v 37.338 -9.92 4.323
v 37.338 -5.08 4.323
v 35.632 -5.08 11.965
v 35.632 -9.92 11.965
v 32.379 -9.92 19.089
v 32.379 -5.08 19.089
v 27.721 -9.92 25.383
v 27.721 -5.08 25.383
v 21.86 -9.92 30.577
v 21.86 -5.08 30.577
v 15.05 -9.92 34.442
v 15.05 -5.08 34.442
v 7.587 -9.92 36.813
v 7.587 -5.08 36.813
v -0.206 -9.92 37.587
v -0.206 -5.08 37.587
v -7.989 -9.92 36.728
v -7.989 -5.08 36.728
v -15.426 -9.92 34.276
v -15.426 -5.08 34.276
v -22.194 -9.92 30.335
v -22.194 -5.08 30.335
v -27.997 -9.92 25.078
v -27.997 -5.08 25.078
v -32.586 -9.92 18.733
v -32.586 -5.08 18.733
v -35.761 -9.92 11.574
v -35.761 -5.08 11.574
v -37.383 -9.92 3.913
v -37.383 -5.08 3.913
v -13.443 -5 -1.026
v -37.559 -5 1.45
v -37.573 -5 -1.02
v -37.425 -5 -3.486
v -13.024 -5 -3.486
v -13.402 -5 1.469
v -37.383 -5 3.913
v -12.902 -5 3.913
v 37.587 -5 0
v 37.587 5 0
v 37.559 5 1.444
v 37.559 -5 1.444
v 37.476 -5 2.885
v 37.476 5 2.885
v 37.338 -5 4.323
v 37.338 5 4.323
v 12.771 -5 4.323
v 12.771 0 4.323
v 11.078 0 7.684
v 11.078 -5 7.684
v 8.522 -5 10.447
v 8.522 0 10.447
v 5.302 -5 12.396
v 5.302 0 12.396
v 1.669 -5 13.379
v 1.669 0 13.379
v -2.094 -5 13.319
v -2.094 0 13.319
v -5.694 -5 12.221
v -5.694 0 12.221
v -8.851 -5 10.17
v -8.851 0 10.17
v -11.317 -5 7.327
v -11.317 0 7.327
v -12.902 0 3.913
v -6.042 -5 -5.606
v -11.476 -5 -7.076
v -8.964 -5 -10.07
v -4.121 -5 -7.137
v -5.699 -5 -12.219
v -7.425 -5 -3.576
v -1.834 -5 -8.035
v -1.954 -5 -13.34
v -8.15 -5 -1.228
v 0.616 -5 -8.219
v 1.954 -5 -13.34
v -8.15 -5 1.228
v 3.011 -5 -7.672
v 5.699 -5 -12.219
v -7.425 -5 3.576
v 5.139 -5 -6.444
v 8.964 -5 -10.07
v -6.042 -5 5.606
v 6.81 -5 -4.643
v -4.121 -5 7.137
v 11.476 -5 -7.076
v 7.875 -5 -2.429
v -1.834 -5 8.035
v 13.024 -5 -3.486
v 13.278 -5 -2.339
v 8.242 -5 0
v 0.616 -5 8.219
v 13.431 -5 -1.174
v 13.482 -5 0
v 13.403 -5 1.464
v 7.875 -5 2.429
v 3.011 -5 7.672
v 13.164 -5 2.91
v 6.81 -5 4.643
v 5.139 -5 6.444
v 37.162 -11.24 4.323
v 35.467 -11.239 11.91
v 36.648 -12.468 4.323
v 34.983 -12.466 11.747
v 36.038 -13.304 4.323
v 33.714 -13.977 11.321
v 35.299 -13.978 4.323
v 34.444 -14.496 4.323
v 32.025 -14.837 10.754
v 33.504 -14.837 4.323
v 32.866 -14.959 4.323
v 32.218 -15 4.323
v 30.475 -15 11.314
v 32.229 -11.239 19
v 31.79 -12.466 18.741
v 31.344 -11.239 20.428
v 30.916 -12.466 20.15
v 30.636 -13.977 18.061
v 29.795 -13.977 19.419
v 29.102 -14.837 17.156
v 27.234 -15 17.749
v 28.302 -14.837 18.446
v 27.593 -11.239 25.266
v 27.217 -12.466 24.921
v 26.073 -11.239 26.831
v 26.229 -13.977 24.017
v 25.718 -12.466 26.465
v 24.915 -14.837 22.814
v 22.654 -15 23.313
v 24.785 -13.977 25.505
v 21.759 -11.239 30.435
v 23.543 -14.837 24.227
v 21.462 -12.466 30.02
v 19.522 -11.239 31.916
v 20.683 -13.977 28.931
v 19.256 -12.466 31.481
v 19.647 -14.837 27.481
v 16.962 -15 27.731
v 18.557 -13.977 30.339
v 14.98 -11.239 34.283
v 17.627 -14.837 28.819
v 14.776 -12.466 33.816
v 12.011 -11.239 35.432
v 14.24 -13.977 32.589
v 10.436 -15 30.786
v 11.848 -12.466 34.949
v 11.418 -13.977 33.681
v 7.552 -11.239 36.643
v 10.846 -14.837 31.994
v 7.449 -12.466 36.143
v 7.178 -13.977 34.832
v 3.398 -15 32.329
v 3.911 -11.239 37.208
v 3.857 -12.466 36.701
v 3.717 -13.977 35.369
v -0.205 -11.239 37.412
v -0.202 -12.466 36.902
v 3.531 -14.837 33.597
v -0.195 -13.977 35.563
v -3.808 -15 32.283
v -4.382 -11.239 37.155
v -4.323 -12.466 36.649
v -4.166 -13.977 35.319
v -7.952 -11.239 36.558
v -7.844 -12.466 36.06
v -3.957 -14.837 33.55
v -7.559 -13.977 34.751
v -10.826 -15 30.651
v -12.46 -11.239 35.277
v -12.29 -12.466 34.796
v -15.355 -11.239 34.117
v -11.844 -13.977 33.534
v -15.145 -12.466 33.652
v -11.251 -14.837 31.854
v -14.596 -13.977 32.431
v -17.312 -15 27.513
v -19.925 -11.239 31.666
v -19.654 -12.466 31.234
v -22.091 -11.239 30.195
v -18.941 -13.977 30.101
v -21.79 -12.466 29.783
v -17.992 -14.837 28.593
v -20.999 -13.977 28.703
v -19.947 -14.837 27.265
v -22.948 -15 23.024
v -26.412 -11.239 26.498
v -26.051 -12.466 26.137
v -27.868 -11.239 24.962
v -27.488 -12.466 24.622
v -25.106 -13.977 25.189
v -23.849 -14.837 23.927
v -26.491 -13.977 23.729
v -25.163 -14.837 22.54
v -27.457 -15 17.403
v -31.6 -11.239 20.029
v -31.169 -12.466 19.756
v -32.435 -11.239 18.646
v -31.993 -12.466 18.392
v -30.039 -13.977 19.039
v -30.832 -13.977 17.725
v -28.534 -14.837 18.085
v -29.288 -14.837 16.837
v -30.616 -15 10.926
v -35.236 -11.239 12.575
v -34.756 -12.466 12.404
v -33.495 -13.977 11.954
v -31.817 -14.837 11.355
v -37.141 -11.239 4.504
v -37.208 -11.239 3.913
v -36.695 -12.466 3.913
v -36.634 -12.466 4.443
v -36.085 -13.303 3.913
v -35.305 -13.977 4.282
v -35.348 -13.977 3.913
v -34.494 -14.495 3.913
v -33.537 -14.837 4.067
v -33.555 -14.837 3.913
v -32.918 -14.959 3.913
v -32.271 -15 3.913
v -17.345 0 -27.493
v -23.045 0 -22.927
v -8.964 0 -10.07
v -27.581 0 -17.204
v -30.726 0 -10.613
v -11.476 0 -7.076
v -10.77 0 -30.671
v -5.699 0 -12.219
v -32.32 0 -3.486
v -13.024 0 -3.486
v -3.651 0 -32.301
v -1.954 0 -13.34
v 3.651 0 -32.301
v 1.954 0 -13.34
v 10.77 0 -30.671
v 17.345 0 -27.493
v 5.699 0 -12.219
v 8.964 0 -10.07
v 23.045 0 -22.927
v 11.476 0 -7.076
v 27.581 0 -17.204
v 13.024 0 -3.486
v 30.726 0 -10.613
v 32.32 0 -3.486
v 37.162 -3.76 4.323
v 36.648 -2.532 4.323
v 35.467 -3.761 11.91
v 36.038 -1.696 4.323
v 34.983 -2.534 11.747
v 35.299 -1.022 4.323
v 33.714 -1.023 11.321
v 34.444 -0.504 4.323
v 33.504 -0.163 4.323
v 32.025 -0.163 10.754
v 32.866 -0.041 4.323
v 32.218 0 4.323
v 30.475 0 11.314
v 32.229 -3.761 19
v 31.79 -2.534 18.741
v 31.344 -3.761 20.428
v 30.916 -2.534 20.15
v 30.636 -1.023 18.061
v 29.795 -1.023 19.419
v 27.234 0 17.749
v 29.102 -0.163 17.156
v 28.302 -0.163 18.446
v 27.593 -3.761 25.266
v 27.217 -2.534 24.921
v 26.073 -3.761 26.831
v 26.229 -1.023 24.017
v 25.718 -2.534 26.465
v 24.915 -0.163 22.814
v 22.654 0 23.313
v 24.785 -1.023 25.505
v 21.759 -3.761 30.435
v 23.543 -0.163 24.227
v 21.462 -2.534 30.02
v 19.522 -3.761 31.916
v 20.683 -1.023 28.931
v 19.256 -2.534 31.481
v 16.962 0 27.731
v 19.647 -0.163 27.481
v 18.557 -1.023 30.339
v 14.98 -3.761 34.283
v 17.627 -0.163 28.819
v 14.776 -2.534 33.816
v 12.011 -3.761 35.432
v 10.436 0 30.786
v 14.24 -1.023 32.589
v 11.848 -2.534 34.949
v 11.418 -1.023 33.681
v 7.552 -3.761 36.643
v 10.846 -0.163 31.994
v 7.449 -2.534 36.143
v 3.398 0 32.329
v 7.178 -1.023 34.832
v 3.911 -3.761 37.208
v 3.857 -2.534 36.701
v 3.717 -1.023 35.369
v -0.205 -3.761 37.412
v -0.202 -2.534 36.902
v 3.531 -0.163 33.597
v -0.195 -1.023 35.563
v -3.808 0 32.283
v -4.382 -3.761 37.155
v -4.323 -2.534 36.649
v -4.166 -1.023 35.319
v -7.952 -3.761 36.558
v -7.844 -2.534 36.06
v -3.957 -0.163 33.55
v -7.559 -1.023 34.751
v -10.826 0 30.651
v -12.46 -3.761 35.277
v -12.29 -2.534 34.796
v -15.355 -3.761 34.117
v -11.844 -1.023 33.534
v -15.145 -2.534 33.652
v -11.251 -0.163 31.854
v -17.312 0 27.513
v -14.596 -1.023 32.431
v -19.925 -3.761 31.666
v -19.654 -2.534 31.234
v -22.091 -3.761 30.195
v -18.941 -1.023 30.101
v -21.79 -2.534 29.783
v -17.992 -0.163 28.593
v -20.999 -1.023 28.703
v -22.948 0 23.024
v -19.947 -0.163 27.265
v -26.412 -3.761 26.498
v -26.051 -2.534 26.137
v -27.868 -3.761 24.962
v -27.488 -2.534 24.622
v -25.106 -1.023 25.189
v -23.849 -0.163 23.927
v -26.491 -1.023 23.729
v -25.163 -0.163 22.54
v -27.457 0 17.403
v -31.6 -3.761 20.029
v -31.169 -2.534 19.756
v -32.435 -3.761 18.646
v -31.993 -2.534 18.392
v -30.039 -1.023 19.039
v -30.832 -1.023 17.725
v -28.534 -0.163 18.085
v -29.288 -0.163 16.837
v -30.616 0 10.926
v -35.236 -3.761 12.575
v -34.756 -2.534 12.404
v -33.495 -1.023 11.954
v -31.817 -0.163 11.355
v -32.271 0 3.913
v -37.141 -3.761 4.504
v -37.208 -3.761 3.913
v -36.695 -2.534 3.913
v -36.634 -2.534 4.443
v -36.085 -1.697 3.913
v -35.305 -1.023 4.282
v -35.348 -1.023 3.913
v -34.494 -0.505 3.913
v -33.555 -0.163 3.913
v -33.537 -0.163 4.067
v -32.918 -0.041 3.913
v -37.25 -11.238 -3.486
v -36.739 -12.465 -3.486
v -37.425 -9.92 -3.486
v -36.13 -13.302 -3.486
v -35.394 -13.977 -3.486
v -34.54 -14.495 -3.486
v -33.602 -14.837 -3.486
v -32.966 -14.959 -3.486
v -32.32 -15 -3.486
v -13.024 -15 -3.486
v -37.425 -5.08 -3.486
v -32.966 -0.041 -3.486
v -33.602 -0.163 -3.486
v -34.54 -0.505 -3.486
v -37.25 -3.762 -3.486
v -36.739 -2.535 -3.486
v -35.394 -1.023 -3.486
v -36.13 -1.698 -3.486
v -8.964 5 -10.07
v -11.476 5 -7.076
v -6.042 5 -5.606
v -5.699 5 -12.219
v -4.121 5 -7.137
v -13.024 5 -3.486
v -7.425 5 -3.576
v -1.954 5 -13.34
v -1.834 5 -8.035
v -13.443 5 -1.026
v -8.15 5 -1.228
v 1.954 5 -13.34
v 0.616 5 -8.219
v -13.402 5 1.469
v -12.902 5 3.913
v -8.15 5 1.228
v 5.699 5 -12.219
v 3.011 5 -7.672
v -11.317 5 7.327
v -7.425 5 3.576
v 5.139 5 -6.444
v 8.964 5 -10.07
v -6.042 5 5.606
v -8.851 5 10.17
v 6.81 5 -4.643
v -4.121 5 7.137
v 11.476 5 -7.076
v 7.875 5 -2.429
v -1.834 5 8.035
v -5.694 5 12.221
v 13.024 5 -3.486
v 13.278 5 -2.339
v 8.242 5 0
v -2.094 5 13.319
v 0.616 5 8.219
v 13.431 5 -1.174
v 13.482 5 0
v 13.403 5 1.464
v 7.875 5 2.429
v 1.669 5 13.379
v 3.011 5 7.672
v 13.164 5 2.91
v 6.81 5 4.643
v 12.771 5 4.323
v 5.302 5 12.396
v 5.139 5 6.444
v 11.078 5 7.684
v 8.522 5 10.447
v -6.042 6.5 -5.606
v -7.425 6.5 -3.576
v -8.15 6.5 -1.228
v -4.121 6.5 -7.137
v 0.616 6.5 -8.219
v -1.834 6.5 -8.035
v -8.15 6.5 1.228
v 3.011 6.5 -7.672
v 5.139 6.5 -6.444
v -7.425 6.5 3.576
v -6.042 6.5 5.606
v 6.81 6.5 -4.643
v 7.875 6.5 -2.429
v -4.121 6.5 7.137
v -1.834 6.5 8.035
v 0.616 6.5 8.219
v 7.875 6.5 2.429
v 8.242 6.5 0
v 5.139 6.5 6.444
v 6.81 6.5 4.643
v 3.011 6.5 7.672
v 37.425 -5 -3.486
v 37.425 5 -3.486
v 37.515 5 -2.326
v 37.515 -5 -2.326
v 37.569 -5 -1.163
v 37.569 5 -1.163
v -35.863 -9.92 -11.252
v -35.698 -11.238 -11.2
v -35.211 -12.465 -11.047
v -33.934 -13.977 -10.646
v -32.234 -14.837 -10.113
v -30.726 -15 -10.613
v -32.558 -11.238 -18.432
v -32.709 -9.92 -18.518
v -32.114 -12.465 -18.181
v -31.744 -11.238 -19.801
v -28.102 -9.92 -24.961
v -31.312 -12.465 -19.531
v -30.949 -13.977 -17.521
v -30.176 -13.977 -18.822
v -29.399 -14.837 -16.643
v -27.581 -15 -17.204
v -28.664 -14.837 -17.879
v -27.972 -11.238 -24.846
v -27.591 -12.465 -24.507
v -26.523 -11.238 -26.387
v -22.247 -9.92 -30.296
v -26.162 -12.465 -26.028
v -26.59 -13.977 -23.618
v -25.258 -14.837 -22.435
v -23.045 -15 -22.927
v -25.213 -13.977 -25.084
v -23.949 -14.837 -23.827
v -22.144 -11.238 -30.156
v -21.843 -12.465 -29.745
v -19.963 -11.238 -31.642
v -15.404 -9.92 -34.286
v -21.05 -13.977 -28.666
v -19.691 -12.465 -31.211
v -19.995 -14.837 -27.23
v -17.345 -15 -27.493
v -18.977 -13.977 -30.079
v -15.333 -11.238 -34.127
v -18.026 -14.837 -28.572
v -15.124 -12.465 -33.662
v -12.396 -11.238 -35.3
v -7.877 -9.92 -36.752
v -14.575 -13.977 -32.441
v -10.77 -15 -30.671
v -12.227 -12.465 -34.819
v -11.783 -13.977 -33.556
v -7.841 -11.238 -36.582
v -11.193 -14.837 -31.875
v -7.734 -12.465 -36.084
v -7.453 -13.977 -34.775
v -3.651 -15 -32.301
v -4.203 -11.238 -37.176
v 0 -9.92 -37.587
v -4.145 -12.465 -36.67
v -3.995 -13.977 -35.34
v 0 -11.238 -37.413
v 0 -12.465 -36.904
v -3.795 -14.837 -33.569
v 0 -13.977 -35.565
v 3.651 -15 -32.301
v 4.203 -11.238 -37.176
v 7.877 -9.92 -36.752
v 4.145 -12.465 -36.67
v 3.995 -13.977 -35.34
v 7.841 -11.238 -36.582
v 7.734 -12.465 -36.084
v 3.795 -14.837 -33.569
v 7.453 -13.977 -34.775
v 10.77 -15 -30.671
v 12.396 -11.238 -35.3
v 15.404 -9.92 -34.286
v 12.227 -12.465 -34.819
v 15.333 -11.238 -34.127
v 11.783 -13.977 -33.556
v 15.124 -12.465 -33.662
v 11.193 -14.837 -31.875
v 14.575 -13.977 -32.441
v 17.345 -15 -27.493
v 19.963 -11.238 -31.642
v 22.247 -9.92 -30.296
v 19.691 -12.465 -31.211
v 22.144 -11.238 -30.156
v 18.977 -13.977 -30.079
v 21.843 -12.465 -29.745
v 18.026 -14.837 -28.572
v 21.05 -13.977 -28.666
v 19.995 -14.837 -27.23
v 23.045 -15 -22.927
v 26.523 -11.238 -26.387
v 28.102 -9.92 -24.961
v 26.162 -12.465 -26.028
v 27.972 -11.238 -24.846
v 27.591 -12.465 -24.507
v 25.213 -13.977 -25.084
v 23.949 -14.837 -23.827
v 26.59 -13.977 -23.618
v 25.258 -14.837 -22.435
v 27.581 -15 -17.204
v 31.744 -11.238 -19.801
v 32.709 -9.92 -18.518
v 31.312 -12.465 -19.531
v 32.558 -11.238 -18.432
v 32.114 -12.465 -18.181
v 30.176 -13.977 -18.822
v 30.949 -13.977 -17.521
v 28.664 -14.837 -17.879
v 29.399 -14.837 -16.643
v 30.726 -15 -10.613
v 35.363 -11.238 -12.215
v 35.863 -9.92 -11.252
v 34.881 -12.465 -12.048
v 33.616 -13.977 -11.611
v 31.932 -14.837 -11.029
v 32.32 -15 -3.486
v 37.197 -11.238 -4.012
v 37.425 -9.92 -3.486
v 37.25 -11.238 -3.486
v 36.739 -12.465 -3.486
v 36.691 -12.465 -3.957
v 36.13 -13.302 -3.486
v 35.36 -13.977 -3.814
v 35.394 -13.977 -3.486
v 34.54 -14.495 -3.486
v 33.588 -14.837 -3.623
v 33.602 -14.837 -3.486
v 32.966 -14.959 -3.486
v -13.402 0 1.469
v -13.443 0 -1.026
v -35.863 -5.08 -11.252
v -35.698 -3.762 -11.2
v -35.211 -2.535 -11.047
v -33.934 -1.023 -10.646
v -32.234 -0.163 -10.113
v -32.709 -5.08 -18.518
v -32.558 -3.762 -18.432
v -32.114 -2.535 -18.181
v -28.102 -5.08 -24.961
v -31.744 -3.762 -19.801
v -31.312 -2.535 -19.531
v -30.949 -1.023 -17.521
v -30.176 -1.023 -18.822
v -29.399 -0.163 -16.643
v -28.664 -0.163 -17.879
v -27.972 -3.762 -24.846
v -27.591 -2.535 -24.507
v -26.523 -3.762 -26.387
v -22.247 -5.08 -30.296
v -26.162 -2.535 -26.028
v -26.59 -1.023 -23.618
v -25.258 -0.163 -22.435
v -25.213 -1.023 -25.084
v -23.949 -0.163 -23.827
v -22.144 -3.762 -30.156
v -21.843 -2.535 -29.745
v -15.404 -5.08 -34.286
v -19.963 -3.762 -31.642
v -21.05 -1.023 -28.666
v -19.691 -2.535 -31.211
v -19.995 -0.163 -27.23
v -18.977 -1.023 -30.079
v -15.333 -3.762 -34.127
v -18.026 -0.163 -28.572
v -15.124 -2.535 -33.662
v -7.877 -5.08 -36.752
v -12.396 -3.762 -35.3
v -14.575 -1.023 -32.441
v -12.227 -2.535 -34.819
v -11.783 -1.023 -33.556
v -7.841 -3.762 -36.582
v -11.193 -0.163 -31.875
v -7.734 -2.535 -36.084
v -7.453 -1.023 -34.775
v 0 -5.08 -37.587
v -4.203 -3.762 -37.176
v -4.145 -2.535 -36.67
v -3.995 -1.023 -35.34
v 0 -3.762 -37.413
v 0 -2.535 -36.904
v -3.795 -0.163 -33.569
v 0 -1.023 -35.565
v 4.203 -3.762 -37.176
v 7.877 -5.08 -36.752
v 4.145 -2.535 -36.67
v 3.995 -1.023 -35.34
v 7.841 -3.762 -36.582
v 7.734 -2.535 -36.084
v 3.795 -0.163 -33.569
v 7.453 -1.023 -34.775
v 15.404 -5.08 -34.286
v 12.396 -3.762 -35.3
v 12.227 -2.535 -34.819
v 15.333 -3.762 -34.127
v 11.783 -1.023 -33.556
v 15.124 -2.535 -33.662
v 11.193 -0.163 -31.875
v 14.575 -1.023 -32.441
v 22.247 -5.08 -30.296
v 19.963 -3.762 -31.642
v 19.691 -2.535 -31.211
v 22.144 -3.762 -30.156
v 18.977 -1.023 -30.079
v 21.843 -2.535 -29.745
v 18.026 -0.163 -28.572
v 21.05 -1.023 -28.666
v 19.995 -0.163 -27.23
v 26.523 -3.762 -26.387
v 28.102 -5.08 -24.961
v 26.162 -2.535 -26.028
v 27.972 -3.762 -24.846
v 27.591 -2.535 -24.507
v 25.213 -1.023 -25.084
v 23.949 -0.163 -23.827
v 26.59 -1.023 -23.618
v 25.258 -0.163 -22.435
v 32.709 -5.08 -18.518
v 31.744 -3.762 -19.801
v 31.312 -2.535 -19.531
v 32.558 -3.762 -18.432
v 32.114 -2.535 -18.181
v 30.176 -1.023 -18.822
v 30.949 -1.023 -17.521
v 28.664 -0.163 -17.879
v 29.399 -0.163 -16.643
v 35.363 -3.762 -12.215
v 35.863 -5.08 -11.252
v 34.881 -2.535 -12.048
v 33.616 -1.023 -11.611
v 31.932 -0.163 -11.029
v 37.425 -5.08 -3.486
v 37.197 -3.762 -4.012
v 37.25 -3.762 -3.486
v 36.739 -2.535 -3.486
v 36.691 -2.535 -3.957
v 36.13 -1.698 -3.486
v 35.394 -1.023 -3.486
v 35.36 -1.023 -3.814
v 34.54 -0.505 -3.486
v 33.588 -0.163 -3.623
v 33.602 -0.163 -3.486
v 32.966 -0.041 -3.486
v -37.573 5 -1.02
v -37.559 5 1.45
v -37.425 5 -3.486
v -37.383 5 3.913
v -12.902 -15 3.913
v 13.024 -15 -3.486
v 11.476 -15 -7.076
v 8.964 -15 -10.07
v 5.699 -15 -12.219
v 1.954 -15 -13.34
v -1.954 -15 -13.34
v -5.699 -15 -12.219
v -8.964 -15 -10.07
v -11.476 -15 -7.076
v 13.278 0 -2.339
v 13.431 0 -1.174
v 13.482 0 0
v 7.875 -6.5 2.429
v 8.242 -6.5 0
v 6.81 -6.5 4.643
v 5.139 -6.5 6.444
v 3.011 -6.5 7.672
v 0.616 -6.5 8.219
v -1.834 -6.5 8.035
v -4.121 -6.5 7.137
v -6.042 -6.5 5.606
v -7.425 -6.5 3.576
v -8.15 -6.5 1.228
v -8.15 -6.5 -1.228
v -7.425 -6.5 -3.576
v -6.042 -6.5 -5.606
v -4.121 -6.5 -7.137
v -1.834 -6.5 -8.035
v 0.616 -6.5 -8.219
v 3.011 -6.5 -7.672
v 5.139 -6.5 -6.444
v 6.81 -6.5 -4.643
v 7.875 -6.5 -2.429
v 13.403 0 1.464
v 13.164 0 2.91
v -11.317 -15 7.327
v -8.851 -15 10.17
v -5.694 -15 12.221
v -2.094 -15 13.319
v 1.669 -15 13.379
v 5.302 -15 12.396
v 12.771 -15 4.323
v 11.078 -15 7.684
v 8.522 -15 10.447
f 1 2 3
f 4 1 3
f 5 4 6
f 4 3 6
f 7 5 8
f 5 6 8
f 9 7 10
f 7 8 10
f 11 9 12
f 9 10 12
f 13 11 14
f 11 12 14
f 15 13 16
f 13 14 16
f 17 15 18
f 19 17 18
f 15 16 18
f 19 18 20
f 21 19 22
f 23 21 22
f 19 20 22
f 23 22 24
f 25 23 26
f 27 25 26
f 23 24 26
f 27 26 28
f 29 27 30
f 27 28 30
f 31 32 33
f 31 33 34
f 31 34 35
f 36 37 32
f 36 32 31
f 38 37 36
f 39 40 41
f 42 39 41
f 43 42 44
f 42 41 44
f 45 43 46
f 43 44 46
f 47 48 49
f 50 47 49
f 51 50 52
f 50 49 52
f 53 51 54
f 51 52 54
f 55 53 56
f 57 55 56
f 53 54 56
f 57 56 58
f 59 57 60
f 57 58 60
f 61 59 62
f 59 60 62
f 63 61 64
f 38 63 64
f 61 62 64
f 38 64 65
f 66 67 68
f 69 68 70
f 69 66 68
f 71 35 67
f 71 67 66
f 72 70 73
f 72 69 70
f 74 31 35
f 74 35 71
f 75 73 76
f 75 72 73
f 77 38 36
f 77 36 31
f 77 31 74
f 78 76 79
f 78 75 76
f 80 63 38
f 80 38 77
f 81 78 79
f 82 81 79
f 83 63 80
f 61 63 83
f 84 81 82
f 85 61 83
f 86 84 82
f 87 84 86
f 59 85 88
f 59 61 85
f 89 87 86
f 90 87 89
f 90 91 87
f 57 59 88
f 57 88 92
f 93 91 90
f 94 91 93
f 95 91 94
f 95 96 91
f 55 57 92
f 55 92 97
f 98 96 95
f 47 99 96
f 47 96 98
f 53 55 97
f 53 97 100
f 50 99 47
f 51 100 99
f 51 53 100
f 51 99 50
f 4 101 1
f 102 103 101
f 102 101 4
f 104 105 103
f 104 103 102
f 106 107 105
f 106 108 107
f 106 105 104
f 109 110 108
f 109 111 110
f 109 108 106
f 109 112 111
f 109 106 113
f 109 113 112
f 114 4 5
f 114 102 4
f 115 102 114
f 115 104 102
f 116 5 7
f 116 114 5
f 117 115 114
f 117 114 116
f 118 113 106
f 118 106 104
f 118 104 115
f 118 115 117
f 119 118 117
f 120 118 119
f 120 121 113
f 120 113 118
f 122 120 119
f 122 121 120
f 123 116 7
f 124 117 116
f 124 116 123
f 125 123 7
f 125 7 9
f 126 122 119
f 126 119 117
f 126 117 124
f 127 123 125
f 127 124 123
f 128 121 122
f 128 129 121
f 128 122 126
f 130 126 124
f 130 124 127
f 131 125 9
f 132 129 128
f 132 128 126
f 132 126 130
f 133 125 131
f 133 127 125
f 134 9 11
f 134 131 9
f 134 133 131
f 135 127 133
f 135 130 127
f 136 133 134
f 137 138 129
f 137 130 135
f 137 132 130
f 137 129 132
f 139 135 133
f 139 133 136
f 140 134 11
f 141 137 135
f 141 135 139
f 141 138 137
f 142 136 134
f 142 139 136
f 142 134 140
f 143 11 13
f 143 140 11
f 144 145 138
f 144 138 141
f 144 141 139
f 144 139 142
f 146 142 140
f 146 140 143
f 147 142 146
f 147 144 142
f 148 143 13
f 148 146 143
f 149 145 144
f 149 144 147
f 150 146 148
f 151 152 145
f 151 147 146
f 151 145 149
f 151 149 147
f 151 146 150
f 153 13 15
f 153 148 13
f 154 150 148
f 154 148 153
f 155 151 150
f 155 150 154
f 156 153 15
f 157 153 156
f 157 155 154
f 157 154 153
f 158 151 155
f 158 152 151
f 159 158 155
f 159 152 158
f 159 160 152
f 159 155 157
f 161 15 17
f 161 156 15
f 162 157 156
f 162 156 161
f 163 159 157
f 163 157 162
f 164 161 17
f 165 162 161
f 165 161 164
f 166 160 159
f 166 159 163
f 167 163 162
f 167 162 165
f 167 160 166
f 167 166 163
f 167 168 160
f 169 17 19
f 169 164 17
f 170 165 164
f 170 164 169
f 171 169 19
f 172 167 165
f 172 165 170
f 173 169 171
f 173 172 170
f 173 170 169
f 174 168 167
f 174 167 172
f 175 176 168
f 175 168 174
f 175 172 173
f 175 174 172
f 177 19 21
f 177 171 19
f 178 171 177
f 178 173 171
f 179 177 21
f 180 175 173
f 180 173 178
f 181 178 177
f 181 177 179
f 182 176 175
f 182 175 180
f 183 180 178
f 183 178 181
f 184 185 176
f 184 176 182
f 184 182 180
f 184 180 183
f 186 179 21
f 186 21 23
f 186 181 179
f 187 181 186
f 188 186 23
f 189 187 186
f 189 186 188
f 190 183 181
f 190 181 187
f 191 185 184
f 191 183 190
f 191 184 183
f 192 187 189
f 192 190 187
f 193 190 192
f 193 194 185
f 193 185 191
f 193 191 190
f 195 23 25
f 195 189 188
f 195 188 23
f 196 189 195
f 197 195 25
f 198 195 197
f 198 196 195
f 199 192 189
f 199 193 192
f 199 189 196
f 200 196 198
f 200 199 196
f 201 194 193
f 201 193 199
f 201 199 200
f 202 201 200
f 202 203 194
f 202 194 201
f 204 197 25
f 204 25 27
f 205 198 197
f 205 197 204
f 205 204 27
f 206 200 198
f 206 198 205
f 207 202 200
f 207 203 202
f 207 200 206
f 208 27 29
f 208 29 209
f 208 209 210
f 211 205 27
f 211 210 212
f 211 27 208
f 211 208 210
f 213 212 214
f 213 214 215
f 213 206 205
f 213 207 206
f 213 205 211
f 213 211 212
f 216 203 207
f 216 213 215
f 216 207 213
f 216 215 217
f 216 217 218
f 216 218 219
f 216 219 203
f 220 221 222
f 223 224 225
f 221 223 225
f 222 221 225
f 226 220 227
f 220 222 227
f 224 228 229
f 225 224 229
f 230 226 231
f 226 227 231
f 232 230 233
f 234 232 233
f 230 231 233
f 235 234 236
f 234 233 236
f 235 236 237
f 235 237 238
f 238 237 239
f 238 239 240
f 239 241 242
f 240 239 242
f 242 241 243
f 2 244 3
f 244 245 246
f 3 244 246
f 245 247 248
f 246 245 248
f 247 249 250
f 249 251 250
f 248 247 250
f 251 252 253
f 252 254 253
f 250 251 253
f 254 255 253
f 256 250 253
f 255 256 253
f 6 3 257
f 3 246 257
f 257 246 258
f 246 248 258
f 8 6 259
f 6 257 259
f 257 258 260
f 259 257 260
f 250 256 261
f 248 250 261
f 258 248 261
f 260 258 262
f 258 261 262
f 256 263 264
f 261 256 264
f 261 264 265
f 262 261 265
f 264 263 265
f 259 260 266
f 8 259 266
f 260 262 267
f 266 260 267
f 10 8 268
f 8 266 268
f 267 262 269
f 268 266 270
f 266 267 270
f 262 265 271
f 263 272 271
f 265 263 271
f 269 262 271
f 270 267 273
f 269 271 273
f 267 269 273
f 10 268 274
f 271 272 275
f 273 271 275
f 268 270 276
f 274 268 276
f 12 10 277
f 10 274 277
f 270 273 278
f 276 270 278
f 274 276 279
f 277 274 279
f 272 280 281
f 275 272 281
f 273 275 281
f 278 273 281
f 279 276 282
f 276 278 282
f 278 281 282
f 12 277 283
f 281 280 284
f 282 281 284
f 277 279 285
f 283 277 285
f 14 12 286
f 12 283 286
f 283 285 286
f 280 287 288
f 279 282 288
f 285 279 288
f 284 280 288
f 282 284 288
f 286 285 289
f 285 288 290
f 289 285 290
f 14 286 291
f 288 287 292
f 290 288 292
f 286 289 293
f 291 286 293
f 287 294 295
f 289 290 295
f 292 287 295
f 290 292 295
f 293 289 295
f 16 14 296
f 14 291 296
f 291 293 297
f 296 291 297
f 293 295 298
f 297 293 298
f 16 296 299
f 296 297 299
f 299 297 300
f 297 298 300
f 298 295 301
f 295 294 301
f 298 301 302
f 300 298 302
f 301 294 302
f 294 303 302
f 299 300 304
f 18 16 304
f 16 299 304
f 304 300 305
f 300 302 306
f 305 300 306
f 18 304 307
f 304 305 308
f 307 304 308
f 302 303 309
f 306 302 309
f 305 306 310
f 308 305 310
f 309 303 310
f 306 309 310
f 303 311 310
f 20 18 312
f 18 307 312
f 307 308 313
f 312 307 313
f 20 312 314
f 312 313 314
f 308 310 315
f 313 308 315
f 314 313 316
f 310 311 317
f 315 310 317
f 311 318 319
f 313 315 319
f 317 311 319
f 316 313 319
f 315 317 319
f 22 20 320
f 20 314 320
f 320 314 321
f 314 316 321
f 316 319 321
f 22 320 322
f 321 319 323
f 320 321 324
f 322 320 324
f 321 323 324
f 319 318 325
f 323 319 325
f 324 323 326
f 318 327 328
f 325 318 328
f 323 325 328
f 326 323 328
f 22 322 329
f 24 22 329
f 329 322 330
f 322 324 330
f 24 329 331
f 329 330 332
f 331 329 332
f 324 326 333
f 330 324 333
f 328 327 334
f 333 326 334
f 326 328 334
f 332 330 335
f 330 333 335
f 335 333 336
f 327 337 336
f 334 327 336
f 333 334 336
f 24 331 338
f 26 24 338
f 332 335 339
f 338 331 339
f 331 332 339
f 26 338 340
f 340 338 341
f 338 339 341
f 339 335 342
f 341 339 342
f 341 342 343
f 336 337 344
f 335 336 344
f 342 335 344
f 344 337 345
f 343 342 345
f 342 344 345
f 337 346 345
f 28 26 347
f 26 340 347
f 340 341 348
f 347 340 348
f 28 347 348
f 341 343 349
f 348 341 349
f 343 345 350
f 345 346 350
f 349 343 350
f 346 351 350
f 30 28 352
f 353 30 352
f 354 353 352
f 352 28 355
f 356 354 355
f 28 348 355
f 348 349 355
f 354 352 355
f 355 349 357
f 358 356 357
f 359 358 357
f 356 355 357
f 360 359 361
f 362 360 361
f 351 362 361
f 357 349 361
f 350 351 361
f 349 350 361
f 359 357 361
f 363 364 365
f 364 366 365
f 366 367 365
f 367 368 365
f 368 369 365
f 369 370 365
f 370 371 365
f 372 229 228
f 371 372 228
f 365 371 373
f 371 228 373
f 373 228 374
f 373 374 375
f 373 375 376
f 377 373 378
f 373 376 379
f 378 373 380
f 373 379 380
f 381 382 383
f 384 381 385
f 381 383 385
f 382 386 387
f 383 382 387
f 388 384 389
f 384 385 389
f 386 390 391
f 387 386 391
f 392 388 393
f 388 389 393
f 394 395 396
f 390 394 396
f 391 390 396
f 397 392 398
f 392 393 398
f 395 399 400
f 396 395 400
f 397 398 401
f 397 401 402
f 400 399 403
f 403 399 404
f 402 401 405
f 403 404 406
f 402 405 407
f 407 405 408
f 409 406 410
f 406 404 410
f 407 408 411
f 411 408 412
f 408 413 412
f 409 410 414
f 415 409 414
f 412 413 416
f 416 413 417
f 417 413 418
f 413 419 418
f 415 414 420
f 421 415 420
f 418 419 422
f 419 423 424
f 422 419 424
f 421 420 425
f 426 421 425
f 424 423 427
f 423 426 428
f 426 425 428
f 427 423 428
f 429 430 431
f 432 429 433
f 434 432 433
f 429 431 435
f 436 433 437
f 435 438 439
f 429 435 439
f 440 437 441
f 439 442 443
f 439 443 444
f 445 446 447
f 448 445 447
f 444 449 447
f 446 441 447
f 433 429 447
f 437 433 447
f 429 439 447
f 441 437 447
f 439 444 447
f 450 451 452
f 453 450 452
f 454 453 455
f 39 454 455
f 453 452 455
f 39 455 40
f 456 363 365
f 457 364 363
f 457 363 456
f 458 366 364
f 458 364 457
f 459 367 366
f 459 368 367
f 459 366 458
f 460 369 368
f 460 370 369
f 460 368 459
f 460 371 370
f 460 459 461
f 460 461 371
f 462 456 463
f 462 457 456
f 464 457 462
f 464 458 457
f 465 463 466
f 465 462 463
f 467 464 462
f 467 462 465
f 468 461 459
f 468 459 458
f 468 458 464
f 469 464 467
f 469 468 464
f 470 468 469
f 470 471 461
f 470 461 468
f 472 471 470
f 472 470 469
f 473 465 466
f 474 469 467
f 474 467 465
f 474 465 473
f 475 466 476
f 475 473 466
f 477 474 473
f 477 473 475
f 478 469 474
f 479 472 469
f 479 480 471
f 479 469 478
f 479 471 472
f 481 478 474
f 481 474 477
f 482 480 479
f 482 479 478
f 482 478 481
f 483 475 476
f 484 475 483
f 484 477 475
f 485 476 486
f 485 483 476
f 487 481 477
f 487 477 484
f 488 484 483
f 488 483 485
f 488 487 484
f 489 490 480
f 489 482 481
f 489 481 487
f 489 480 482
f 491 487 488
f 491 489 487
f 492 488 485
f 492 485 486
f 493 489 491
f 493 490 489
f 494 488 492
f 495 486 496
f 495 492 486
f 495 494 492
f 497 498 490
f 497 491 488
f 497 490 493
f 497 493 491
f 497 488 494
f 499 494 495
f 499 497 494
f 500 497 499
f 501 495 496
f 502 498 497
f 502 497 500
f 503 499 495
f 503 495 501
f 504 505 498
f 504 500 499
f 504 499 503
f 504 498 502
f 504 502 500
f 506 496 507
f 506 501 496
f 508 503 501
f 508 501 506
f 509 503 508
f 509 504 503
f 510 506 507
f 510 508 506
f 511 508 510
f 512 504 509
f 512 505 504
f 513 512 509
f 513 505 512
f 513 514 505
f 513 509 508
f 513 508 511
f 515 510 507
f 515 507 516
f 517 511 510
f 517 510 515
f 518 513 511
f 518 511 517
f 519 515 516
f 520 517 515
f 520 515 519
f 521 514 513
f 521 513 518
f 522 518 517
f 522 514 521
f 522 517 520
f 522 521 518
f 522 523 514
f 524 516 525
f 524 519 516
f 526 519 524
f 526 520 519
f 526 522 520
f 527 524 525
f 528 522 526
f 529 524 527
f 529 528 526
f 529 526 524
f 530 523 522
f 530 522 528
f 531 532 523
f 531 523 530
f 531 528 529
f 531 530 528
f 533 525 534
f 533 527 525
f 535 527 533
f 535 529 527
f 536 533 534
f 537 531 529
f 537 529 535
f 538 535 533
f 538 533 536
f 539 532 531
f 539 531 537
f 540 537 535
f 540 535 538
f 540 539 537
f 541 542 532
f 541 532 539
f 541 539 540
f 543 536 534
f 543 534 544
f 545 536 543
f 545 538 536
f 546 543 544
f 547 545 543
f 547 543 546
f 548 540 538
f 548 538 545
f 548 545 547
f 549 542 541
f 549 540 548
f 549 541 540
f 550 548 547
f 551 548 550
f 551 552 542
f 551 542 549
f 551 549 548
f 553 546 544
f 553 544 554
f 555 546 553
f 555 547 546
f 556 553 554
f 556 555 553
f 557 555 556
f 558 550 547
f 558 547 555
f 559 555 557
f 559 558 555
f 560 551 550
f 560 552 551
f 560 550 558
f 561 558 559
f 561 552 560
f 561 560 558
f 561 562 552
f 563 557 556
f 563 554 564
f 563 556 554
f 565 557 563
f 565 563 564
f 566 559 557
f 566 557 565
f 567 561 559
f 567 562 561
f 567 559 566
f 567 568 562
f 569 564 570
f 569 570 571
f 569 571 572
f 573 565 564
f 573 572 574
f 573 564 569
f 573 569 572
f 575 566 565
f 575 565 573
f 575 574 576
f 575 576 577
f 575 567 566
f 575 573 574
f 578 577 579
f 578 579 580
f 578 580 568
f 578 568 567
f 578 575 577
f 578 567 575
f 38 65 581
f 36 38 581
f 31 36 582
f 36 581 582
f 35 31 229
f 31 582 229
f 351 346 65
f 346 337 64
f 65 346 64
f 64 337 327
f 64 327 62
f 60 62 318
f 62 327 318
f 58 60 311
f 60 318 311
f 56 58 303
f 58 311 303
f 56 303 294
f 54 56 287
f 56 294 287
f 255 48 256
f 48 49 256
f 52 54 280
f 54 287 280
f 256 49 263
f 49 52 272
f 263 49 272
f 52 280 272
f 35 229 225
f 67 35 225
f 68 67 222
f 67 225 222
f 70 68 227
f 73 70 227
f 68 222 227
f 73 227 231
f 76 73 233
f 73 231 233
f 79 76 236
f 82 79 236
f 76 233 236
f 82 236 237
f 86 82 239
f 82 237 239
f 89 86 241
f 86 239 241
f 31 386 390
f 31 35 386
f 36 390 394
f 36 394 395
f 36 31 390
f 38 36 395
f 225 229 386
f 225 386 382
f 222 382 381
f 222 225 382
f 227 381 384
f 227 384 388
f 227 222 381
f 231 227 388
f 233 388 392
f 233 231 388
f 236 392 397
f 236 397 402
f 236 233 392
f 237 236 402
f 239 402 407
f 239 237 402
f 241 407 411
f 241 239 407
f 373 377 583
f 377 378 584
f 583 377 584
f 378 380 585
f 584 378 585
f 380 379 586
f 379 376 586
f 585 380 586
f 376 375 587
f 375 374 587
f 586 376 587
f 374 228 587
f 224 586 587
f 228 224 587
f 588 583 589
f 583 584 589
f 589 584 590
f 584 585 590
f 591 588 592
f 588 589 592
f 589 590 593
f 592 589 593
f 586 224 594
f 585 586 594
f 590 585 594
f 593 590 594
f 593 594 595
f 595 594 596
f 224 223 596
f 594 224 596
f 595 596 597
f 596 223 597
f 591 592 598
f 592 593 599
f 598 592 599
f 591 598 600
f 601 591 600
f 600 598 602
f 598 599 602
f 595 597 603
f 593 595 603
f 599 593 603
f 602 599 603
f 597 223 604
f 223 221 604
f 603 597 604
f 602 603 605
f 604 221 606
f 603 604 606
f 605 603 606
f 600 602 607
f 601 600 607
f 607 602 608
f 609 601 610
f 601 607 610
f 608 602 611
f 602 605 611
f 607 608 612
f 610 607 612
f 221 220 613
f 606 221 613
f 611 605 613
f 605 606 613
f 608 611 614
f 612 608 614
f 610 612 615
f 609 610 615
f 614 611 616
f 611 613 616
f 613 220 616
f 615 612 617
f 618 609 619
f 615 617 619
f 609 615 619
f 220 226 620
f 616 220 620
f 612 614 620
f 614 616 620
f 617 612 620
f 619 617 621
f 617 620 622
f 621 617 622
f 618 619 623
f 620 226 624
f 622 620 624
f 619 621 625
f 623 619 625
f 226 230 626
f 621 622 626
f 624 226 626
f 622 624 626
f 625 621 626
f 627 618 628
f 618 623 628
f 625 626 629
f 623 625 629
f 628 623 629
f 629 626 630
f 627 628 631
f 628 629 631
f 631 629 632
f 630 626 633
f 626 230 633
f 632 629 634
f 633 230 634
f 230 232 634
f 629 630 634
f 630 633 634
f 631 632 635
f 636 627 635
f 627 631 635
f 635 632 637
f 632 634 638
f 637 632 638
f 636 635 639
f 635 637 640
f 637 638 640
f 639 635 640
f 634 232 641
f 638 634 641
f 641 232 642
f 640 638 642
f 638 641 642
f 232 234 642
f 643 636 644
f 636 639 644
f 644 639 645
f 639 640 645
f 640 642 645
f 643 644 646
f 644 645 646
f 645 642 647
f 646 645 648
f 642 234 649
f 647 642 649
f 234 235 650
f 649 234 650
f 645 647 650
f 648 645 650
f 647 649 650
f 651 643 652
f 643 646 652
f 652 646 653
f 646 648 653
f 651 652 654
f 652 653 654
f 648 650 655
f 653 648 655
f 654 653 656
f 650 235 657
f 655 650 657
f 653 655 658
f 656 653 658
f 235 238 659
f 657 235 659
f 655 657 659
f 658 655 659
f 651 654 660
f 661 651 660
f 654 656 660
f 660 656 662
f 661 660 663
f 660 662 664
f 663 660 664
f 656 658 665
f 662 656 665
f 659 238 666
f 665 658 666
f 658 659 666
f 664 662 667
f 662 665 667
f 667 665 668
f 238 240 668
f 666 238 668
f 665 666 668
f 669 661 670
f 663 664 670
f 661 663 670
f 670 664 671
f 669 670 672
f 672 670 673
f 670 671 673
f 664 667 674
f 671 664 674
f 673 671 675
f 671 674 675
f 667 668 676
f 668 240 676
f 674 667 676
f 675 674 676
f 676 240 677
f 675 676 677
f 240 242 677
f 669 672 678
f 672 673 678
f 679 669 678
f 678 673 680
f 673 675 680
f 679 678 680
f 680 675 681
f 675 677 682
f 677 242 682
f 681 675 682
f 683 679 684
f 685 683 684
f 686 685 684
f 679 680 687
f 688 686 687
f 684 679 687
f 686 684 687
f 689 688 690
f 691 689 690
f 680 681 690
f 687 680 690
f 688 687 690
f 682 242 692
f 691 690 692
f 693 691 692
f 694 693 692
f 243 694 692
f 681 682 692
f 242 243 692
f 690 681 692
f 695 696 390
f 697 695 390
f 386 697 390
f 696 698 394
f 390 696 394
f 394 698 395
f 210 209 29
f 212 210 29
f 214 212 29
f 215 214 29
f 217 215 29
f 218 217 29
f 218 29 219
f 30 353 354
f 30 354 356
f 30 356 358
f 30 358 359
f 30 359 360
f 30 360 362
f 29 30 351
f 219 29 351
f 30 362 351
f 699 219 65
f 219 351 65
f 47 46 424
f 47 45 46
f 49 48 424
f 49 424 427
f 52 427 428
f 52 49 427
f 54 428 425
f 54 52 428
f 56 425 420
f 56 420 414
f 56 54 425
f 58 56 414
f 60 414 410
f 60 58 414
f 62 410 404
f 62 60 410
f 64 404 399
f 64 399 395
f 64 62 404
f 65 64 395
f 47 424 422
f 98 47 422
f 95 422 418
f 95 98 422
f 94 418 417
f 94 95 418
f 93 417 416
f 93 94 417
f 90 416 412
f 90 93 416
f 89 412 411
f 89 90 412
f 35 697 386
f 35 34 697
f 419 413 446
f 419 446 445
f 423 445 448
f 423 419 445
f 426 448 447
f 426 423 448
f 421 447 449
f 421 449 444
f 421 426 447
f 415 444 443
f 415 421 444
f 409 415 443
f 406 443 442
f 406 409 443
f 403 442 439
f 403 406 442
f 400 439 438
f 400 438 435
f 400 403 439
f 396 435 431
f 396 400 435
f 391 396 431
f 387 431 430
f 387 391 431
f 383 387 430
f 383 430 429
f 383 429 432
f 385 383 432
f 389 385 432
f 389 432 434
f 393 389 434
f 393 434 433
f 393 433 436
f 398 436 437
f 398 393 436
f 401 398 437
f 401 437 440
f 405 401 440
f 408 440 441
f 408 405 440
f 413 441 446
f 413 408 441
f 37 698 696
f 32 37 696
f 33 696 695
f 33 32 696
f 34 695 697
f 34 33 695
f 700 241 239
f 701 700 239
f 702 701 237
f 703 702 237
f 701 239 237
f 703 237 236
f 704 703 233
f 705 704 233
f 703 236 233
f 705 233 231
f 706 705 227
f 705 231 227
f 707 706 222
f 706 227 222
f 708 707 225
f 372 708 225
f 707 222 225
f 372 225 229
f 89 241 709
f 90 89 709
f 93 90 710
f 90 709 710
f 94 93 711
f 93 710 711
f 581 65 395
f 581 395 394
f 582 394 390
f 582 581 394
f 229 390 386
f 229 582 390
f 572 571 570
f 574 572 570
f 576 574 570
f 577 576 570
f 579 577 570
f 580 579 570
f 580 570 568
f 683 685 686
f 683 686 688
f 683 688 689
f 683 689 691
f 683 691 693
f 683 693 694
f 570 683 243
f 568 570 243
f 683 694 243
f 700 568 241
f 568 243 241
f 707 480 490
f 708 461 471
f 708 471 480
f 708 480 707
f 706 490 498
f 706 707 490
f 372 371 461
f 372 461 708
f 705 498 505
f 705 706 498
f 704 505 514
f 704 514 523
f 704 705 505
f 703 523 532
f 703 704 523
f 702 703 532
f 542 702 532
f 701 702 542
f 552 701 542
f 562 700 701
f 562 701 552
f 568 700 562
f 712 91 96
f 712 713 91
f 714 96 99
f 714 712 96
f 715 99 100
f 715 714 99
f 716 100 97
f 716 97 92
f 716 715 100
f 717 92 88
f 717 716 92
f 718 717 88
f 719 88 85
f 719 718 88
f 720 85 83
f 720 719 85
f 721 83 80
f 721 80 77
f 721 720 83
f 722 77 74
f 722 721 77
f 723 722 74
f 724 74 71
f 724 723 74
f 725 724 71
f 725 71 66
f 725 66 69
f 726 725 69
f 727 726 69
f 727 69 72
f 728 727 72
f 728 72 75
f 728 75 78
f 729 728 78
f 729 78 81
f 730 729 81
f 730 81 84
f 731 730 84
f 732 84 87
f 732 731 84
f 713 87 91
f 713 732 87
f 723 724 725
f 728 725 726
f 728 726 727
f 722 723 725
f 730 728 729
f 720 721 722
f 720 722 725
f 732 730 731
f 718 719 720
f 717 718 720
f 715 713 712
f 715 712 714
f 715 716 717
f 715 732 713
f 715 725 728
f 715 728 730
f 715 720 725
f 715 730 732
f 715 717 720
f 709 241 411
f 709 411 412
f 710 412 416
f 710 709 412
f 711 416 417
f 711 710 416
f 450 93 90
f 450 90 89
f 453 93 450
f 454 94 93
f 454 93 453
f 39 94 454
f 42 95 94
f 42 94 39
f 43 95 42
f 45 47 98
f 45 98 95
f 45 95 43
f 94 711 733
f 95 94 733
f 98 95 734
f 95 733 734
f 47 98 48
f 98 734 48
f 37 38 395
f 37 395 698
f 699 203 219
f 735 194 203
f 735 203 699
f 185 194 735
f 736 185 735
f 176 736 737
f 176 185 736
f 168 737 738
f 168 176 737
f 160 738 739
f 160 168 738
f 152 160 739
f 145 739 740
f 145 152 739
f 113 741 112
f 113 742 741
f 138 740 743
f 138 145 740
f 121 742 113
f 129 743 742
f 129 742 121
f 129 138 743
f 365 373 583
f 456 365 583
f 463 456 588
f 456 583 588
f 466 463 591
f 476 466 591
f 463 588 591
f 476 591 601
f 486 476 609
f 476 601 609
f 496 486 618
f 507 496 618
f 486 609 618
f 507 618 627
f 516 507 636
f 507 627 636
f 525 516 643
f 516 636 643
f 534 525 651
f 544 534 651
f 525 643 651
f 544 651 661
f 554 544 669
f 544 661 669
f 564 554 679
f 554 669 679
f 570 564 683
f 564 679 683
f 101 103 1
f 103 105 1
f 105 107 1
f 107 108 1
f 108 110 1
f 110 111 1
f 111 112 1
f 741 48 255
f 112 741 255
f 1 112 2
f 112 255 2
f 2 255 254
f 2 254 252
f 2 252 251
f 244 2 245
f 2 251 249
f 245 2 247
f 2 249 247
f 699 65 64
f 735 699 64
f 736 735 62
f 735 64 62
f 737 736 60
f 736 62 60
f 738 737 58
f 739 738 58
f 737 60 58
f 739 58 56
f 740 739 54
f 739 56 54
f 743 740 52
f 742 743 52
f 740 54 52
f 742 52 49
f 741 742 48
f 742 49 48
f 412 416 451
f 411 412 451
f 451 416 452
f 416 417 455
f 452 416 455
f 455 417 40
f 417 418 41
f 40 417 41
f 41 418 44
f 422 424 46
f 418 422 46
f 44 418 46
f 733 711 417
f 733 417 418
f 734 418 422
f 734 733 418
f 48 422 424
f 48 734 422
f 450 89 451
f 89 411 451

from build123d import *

# Parameters (mm, degrees)
F1_DEPTH = 15
F0_R     = 8.2416015479
F2_DEPTH = 5
F3_DEPTH = 6.5
F4_DEPTH = 5
F5_R     = 5.08
F5_2_R   = 5.08


with BuildPart() as f1:
    # F0 (on Front) → F1 (new body)
    with BuildSketch(Plane.XZ):
        with BuildLine():
            Line((37.4250772246, -3.4860127999), (13.0237893567, -3.4860127999))
            ThreePointArc((13.0237893567, -3.4860127999), (0, -13.4822614739), (-13.0237893567, -3.4860127999))
            Line((-13.0237893567, -3.4860127999), (-37.4250772246, -3.4860127999))
            ThreePointArc((-37.4250772246, -3.4860127999), (0, -37.5870814311), (37.4250772246, -3.4860127999))
        make_face()
    extrude(amount=F1_DEPTH)

    # F5#2
    f5_2_edges = [f1.edges().sort_by_distance(p)[0] for p in [
        (0, -15, -37.587081),
        (0, 0, -37.587081),
    ]]
    fillet(f5_2_edges, radius=F5_2_R)


with BuildPart() as f1b:
    # F0 (on Front) → F1, piece 2 (new body)
    with BuildSketch(Plane.XZ):
        with BuildLine():
            ThreePointArc((-12.9017788597, 3.9134992915), (-0.214800106, 13.4805502619), (12.7705448046, 4.3225640357))
            Line((12.7705448046, 4.3225640357), (37.3377038751, 4.3225640357))
            ThreePointArc((37.3377038751, 4.3225640357), (-0.2057711081, 37.5865181782), (-37.3827930177, 3.9134992915))
            Line((-37.3827930177, 3.9134992915), (-12.9017788597, 3.9134992915))
        make_face()
    extrude(amount=F1_DEPTH)

    # F5
    f5_edges = [f1b.edges().sort_by_distance(p)[0] for p in [
        (-0.205771, -15, 37.586518),
        (-0.205771, 0, 37.586518),
    ]]
    fillet(f5_edges, radius=F5_R)


with BuildPart() as f2:
    # F0 (on Front) → F2 (new body, symmetric)
    with BuildSketch(Plane.XZ):
        with BuildLine():
            ThreePointArc((13.0237893567, -3.4860127999), (13.3671520515, -1.7580160639), (13.4822614739, 0))
            ThreePointArc((13.4822614739, 0), (13.3031424609, 2.1903824129), (12.7705448046, 4.3225640357))
            ThreePointArc((12.7705448046, 4.3225640357), (-0.214800106, 13.4805502619), (-12.9017788597, 3.9134992915))
            ThreePointArc((-12.9017788597, 3.9134992915), (-13.4804290226, 0.2222786887), (-13.0237893567, -3.4860127999))
            ThreePointArc((-13.0237893567, -3.4860127999), (0, -13.4822614739), (13.0237893567, -3.4860127999))
        make_face()
        Circle(F0_R, mode=Mode.SUBTRACT)
    extrude(amount=F2_DEPTH, both=True)

    # F0 (on Front) → F3 (join, symmetric)
    with BuildSketch(Plane.XZ):
        Circle(F0_R)
    extrude(amount=F3_DEPTH, both=True)


with BuildPart() as f4:
    # F0 (on Front) → F4 (new body, symmetric)
    with BuildSketch(Plane.XZ):
        with BuildLine():
            ThreePointArc((-13.0237893567, -3.4860127999), (-13.4804290226, 0.2222786887), (-12.9017788597, 3.9134992915))
            Line((-12.9017788597, 3.9134992915), (-37.3827930177, 3.9134992915))
            ThreePointArc((-37.3827930177, 3.9134992915), (-37.5864677423, 0.2147863209), (-37.4250772246, -3.4860127999))
            Line((-37.4250772246, -3.4860127999), (-13.0237893567, -3.4860127999))
        make_face()
    extrude(amount=F4_DEPTH, both=True)


with BuildPart() as f4b:
    # F0 (on Front) → F4, piece 2 (new body, symmetric)
    with BuildSketch(Plane.XZ):
        with BuildLine():
            ThreePointArc((12.7705448046, 4.3225640357), (13.3031424609, 2.1903824129), (13.4822614739, 0))
            ThreePointArc((13.4822614739, 0), (13.3671520515, -1.7580160639), (13.0237893567, -3.4860127999))
            Line((13.0237893567, -3.4860127999), (37.4250772246, -3.4860127999))
            ThreePointArc((37.4250772246, -3.4860127999), (37.5465585355, -1.7448875755), (37.5870814311, 0))
            ThreePointArc((37.5870814311, 0), (37.5246852519, 2.1648758052), (37.3377038751, 4.3225640357))
            Line((37.3377038751, 4.3225640357), (12.7705448046, 4.3225640357))
        make_face()
    extrude(amount=F4_DEPTH, both=True)


solid = Compound([f1.part, f1b.part, f2.part, f4.part, f4b.part])
